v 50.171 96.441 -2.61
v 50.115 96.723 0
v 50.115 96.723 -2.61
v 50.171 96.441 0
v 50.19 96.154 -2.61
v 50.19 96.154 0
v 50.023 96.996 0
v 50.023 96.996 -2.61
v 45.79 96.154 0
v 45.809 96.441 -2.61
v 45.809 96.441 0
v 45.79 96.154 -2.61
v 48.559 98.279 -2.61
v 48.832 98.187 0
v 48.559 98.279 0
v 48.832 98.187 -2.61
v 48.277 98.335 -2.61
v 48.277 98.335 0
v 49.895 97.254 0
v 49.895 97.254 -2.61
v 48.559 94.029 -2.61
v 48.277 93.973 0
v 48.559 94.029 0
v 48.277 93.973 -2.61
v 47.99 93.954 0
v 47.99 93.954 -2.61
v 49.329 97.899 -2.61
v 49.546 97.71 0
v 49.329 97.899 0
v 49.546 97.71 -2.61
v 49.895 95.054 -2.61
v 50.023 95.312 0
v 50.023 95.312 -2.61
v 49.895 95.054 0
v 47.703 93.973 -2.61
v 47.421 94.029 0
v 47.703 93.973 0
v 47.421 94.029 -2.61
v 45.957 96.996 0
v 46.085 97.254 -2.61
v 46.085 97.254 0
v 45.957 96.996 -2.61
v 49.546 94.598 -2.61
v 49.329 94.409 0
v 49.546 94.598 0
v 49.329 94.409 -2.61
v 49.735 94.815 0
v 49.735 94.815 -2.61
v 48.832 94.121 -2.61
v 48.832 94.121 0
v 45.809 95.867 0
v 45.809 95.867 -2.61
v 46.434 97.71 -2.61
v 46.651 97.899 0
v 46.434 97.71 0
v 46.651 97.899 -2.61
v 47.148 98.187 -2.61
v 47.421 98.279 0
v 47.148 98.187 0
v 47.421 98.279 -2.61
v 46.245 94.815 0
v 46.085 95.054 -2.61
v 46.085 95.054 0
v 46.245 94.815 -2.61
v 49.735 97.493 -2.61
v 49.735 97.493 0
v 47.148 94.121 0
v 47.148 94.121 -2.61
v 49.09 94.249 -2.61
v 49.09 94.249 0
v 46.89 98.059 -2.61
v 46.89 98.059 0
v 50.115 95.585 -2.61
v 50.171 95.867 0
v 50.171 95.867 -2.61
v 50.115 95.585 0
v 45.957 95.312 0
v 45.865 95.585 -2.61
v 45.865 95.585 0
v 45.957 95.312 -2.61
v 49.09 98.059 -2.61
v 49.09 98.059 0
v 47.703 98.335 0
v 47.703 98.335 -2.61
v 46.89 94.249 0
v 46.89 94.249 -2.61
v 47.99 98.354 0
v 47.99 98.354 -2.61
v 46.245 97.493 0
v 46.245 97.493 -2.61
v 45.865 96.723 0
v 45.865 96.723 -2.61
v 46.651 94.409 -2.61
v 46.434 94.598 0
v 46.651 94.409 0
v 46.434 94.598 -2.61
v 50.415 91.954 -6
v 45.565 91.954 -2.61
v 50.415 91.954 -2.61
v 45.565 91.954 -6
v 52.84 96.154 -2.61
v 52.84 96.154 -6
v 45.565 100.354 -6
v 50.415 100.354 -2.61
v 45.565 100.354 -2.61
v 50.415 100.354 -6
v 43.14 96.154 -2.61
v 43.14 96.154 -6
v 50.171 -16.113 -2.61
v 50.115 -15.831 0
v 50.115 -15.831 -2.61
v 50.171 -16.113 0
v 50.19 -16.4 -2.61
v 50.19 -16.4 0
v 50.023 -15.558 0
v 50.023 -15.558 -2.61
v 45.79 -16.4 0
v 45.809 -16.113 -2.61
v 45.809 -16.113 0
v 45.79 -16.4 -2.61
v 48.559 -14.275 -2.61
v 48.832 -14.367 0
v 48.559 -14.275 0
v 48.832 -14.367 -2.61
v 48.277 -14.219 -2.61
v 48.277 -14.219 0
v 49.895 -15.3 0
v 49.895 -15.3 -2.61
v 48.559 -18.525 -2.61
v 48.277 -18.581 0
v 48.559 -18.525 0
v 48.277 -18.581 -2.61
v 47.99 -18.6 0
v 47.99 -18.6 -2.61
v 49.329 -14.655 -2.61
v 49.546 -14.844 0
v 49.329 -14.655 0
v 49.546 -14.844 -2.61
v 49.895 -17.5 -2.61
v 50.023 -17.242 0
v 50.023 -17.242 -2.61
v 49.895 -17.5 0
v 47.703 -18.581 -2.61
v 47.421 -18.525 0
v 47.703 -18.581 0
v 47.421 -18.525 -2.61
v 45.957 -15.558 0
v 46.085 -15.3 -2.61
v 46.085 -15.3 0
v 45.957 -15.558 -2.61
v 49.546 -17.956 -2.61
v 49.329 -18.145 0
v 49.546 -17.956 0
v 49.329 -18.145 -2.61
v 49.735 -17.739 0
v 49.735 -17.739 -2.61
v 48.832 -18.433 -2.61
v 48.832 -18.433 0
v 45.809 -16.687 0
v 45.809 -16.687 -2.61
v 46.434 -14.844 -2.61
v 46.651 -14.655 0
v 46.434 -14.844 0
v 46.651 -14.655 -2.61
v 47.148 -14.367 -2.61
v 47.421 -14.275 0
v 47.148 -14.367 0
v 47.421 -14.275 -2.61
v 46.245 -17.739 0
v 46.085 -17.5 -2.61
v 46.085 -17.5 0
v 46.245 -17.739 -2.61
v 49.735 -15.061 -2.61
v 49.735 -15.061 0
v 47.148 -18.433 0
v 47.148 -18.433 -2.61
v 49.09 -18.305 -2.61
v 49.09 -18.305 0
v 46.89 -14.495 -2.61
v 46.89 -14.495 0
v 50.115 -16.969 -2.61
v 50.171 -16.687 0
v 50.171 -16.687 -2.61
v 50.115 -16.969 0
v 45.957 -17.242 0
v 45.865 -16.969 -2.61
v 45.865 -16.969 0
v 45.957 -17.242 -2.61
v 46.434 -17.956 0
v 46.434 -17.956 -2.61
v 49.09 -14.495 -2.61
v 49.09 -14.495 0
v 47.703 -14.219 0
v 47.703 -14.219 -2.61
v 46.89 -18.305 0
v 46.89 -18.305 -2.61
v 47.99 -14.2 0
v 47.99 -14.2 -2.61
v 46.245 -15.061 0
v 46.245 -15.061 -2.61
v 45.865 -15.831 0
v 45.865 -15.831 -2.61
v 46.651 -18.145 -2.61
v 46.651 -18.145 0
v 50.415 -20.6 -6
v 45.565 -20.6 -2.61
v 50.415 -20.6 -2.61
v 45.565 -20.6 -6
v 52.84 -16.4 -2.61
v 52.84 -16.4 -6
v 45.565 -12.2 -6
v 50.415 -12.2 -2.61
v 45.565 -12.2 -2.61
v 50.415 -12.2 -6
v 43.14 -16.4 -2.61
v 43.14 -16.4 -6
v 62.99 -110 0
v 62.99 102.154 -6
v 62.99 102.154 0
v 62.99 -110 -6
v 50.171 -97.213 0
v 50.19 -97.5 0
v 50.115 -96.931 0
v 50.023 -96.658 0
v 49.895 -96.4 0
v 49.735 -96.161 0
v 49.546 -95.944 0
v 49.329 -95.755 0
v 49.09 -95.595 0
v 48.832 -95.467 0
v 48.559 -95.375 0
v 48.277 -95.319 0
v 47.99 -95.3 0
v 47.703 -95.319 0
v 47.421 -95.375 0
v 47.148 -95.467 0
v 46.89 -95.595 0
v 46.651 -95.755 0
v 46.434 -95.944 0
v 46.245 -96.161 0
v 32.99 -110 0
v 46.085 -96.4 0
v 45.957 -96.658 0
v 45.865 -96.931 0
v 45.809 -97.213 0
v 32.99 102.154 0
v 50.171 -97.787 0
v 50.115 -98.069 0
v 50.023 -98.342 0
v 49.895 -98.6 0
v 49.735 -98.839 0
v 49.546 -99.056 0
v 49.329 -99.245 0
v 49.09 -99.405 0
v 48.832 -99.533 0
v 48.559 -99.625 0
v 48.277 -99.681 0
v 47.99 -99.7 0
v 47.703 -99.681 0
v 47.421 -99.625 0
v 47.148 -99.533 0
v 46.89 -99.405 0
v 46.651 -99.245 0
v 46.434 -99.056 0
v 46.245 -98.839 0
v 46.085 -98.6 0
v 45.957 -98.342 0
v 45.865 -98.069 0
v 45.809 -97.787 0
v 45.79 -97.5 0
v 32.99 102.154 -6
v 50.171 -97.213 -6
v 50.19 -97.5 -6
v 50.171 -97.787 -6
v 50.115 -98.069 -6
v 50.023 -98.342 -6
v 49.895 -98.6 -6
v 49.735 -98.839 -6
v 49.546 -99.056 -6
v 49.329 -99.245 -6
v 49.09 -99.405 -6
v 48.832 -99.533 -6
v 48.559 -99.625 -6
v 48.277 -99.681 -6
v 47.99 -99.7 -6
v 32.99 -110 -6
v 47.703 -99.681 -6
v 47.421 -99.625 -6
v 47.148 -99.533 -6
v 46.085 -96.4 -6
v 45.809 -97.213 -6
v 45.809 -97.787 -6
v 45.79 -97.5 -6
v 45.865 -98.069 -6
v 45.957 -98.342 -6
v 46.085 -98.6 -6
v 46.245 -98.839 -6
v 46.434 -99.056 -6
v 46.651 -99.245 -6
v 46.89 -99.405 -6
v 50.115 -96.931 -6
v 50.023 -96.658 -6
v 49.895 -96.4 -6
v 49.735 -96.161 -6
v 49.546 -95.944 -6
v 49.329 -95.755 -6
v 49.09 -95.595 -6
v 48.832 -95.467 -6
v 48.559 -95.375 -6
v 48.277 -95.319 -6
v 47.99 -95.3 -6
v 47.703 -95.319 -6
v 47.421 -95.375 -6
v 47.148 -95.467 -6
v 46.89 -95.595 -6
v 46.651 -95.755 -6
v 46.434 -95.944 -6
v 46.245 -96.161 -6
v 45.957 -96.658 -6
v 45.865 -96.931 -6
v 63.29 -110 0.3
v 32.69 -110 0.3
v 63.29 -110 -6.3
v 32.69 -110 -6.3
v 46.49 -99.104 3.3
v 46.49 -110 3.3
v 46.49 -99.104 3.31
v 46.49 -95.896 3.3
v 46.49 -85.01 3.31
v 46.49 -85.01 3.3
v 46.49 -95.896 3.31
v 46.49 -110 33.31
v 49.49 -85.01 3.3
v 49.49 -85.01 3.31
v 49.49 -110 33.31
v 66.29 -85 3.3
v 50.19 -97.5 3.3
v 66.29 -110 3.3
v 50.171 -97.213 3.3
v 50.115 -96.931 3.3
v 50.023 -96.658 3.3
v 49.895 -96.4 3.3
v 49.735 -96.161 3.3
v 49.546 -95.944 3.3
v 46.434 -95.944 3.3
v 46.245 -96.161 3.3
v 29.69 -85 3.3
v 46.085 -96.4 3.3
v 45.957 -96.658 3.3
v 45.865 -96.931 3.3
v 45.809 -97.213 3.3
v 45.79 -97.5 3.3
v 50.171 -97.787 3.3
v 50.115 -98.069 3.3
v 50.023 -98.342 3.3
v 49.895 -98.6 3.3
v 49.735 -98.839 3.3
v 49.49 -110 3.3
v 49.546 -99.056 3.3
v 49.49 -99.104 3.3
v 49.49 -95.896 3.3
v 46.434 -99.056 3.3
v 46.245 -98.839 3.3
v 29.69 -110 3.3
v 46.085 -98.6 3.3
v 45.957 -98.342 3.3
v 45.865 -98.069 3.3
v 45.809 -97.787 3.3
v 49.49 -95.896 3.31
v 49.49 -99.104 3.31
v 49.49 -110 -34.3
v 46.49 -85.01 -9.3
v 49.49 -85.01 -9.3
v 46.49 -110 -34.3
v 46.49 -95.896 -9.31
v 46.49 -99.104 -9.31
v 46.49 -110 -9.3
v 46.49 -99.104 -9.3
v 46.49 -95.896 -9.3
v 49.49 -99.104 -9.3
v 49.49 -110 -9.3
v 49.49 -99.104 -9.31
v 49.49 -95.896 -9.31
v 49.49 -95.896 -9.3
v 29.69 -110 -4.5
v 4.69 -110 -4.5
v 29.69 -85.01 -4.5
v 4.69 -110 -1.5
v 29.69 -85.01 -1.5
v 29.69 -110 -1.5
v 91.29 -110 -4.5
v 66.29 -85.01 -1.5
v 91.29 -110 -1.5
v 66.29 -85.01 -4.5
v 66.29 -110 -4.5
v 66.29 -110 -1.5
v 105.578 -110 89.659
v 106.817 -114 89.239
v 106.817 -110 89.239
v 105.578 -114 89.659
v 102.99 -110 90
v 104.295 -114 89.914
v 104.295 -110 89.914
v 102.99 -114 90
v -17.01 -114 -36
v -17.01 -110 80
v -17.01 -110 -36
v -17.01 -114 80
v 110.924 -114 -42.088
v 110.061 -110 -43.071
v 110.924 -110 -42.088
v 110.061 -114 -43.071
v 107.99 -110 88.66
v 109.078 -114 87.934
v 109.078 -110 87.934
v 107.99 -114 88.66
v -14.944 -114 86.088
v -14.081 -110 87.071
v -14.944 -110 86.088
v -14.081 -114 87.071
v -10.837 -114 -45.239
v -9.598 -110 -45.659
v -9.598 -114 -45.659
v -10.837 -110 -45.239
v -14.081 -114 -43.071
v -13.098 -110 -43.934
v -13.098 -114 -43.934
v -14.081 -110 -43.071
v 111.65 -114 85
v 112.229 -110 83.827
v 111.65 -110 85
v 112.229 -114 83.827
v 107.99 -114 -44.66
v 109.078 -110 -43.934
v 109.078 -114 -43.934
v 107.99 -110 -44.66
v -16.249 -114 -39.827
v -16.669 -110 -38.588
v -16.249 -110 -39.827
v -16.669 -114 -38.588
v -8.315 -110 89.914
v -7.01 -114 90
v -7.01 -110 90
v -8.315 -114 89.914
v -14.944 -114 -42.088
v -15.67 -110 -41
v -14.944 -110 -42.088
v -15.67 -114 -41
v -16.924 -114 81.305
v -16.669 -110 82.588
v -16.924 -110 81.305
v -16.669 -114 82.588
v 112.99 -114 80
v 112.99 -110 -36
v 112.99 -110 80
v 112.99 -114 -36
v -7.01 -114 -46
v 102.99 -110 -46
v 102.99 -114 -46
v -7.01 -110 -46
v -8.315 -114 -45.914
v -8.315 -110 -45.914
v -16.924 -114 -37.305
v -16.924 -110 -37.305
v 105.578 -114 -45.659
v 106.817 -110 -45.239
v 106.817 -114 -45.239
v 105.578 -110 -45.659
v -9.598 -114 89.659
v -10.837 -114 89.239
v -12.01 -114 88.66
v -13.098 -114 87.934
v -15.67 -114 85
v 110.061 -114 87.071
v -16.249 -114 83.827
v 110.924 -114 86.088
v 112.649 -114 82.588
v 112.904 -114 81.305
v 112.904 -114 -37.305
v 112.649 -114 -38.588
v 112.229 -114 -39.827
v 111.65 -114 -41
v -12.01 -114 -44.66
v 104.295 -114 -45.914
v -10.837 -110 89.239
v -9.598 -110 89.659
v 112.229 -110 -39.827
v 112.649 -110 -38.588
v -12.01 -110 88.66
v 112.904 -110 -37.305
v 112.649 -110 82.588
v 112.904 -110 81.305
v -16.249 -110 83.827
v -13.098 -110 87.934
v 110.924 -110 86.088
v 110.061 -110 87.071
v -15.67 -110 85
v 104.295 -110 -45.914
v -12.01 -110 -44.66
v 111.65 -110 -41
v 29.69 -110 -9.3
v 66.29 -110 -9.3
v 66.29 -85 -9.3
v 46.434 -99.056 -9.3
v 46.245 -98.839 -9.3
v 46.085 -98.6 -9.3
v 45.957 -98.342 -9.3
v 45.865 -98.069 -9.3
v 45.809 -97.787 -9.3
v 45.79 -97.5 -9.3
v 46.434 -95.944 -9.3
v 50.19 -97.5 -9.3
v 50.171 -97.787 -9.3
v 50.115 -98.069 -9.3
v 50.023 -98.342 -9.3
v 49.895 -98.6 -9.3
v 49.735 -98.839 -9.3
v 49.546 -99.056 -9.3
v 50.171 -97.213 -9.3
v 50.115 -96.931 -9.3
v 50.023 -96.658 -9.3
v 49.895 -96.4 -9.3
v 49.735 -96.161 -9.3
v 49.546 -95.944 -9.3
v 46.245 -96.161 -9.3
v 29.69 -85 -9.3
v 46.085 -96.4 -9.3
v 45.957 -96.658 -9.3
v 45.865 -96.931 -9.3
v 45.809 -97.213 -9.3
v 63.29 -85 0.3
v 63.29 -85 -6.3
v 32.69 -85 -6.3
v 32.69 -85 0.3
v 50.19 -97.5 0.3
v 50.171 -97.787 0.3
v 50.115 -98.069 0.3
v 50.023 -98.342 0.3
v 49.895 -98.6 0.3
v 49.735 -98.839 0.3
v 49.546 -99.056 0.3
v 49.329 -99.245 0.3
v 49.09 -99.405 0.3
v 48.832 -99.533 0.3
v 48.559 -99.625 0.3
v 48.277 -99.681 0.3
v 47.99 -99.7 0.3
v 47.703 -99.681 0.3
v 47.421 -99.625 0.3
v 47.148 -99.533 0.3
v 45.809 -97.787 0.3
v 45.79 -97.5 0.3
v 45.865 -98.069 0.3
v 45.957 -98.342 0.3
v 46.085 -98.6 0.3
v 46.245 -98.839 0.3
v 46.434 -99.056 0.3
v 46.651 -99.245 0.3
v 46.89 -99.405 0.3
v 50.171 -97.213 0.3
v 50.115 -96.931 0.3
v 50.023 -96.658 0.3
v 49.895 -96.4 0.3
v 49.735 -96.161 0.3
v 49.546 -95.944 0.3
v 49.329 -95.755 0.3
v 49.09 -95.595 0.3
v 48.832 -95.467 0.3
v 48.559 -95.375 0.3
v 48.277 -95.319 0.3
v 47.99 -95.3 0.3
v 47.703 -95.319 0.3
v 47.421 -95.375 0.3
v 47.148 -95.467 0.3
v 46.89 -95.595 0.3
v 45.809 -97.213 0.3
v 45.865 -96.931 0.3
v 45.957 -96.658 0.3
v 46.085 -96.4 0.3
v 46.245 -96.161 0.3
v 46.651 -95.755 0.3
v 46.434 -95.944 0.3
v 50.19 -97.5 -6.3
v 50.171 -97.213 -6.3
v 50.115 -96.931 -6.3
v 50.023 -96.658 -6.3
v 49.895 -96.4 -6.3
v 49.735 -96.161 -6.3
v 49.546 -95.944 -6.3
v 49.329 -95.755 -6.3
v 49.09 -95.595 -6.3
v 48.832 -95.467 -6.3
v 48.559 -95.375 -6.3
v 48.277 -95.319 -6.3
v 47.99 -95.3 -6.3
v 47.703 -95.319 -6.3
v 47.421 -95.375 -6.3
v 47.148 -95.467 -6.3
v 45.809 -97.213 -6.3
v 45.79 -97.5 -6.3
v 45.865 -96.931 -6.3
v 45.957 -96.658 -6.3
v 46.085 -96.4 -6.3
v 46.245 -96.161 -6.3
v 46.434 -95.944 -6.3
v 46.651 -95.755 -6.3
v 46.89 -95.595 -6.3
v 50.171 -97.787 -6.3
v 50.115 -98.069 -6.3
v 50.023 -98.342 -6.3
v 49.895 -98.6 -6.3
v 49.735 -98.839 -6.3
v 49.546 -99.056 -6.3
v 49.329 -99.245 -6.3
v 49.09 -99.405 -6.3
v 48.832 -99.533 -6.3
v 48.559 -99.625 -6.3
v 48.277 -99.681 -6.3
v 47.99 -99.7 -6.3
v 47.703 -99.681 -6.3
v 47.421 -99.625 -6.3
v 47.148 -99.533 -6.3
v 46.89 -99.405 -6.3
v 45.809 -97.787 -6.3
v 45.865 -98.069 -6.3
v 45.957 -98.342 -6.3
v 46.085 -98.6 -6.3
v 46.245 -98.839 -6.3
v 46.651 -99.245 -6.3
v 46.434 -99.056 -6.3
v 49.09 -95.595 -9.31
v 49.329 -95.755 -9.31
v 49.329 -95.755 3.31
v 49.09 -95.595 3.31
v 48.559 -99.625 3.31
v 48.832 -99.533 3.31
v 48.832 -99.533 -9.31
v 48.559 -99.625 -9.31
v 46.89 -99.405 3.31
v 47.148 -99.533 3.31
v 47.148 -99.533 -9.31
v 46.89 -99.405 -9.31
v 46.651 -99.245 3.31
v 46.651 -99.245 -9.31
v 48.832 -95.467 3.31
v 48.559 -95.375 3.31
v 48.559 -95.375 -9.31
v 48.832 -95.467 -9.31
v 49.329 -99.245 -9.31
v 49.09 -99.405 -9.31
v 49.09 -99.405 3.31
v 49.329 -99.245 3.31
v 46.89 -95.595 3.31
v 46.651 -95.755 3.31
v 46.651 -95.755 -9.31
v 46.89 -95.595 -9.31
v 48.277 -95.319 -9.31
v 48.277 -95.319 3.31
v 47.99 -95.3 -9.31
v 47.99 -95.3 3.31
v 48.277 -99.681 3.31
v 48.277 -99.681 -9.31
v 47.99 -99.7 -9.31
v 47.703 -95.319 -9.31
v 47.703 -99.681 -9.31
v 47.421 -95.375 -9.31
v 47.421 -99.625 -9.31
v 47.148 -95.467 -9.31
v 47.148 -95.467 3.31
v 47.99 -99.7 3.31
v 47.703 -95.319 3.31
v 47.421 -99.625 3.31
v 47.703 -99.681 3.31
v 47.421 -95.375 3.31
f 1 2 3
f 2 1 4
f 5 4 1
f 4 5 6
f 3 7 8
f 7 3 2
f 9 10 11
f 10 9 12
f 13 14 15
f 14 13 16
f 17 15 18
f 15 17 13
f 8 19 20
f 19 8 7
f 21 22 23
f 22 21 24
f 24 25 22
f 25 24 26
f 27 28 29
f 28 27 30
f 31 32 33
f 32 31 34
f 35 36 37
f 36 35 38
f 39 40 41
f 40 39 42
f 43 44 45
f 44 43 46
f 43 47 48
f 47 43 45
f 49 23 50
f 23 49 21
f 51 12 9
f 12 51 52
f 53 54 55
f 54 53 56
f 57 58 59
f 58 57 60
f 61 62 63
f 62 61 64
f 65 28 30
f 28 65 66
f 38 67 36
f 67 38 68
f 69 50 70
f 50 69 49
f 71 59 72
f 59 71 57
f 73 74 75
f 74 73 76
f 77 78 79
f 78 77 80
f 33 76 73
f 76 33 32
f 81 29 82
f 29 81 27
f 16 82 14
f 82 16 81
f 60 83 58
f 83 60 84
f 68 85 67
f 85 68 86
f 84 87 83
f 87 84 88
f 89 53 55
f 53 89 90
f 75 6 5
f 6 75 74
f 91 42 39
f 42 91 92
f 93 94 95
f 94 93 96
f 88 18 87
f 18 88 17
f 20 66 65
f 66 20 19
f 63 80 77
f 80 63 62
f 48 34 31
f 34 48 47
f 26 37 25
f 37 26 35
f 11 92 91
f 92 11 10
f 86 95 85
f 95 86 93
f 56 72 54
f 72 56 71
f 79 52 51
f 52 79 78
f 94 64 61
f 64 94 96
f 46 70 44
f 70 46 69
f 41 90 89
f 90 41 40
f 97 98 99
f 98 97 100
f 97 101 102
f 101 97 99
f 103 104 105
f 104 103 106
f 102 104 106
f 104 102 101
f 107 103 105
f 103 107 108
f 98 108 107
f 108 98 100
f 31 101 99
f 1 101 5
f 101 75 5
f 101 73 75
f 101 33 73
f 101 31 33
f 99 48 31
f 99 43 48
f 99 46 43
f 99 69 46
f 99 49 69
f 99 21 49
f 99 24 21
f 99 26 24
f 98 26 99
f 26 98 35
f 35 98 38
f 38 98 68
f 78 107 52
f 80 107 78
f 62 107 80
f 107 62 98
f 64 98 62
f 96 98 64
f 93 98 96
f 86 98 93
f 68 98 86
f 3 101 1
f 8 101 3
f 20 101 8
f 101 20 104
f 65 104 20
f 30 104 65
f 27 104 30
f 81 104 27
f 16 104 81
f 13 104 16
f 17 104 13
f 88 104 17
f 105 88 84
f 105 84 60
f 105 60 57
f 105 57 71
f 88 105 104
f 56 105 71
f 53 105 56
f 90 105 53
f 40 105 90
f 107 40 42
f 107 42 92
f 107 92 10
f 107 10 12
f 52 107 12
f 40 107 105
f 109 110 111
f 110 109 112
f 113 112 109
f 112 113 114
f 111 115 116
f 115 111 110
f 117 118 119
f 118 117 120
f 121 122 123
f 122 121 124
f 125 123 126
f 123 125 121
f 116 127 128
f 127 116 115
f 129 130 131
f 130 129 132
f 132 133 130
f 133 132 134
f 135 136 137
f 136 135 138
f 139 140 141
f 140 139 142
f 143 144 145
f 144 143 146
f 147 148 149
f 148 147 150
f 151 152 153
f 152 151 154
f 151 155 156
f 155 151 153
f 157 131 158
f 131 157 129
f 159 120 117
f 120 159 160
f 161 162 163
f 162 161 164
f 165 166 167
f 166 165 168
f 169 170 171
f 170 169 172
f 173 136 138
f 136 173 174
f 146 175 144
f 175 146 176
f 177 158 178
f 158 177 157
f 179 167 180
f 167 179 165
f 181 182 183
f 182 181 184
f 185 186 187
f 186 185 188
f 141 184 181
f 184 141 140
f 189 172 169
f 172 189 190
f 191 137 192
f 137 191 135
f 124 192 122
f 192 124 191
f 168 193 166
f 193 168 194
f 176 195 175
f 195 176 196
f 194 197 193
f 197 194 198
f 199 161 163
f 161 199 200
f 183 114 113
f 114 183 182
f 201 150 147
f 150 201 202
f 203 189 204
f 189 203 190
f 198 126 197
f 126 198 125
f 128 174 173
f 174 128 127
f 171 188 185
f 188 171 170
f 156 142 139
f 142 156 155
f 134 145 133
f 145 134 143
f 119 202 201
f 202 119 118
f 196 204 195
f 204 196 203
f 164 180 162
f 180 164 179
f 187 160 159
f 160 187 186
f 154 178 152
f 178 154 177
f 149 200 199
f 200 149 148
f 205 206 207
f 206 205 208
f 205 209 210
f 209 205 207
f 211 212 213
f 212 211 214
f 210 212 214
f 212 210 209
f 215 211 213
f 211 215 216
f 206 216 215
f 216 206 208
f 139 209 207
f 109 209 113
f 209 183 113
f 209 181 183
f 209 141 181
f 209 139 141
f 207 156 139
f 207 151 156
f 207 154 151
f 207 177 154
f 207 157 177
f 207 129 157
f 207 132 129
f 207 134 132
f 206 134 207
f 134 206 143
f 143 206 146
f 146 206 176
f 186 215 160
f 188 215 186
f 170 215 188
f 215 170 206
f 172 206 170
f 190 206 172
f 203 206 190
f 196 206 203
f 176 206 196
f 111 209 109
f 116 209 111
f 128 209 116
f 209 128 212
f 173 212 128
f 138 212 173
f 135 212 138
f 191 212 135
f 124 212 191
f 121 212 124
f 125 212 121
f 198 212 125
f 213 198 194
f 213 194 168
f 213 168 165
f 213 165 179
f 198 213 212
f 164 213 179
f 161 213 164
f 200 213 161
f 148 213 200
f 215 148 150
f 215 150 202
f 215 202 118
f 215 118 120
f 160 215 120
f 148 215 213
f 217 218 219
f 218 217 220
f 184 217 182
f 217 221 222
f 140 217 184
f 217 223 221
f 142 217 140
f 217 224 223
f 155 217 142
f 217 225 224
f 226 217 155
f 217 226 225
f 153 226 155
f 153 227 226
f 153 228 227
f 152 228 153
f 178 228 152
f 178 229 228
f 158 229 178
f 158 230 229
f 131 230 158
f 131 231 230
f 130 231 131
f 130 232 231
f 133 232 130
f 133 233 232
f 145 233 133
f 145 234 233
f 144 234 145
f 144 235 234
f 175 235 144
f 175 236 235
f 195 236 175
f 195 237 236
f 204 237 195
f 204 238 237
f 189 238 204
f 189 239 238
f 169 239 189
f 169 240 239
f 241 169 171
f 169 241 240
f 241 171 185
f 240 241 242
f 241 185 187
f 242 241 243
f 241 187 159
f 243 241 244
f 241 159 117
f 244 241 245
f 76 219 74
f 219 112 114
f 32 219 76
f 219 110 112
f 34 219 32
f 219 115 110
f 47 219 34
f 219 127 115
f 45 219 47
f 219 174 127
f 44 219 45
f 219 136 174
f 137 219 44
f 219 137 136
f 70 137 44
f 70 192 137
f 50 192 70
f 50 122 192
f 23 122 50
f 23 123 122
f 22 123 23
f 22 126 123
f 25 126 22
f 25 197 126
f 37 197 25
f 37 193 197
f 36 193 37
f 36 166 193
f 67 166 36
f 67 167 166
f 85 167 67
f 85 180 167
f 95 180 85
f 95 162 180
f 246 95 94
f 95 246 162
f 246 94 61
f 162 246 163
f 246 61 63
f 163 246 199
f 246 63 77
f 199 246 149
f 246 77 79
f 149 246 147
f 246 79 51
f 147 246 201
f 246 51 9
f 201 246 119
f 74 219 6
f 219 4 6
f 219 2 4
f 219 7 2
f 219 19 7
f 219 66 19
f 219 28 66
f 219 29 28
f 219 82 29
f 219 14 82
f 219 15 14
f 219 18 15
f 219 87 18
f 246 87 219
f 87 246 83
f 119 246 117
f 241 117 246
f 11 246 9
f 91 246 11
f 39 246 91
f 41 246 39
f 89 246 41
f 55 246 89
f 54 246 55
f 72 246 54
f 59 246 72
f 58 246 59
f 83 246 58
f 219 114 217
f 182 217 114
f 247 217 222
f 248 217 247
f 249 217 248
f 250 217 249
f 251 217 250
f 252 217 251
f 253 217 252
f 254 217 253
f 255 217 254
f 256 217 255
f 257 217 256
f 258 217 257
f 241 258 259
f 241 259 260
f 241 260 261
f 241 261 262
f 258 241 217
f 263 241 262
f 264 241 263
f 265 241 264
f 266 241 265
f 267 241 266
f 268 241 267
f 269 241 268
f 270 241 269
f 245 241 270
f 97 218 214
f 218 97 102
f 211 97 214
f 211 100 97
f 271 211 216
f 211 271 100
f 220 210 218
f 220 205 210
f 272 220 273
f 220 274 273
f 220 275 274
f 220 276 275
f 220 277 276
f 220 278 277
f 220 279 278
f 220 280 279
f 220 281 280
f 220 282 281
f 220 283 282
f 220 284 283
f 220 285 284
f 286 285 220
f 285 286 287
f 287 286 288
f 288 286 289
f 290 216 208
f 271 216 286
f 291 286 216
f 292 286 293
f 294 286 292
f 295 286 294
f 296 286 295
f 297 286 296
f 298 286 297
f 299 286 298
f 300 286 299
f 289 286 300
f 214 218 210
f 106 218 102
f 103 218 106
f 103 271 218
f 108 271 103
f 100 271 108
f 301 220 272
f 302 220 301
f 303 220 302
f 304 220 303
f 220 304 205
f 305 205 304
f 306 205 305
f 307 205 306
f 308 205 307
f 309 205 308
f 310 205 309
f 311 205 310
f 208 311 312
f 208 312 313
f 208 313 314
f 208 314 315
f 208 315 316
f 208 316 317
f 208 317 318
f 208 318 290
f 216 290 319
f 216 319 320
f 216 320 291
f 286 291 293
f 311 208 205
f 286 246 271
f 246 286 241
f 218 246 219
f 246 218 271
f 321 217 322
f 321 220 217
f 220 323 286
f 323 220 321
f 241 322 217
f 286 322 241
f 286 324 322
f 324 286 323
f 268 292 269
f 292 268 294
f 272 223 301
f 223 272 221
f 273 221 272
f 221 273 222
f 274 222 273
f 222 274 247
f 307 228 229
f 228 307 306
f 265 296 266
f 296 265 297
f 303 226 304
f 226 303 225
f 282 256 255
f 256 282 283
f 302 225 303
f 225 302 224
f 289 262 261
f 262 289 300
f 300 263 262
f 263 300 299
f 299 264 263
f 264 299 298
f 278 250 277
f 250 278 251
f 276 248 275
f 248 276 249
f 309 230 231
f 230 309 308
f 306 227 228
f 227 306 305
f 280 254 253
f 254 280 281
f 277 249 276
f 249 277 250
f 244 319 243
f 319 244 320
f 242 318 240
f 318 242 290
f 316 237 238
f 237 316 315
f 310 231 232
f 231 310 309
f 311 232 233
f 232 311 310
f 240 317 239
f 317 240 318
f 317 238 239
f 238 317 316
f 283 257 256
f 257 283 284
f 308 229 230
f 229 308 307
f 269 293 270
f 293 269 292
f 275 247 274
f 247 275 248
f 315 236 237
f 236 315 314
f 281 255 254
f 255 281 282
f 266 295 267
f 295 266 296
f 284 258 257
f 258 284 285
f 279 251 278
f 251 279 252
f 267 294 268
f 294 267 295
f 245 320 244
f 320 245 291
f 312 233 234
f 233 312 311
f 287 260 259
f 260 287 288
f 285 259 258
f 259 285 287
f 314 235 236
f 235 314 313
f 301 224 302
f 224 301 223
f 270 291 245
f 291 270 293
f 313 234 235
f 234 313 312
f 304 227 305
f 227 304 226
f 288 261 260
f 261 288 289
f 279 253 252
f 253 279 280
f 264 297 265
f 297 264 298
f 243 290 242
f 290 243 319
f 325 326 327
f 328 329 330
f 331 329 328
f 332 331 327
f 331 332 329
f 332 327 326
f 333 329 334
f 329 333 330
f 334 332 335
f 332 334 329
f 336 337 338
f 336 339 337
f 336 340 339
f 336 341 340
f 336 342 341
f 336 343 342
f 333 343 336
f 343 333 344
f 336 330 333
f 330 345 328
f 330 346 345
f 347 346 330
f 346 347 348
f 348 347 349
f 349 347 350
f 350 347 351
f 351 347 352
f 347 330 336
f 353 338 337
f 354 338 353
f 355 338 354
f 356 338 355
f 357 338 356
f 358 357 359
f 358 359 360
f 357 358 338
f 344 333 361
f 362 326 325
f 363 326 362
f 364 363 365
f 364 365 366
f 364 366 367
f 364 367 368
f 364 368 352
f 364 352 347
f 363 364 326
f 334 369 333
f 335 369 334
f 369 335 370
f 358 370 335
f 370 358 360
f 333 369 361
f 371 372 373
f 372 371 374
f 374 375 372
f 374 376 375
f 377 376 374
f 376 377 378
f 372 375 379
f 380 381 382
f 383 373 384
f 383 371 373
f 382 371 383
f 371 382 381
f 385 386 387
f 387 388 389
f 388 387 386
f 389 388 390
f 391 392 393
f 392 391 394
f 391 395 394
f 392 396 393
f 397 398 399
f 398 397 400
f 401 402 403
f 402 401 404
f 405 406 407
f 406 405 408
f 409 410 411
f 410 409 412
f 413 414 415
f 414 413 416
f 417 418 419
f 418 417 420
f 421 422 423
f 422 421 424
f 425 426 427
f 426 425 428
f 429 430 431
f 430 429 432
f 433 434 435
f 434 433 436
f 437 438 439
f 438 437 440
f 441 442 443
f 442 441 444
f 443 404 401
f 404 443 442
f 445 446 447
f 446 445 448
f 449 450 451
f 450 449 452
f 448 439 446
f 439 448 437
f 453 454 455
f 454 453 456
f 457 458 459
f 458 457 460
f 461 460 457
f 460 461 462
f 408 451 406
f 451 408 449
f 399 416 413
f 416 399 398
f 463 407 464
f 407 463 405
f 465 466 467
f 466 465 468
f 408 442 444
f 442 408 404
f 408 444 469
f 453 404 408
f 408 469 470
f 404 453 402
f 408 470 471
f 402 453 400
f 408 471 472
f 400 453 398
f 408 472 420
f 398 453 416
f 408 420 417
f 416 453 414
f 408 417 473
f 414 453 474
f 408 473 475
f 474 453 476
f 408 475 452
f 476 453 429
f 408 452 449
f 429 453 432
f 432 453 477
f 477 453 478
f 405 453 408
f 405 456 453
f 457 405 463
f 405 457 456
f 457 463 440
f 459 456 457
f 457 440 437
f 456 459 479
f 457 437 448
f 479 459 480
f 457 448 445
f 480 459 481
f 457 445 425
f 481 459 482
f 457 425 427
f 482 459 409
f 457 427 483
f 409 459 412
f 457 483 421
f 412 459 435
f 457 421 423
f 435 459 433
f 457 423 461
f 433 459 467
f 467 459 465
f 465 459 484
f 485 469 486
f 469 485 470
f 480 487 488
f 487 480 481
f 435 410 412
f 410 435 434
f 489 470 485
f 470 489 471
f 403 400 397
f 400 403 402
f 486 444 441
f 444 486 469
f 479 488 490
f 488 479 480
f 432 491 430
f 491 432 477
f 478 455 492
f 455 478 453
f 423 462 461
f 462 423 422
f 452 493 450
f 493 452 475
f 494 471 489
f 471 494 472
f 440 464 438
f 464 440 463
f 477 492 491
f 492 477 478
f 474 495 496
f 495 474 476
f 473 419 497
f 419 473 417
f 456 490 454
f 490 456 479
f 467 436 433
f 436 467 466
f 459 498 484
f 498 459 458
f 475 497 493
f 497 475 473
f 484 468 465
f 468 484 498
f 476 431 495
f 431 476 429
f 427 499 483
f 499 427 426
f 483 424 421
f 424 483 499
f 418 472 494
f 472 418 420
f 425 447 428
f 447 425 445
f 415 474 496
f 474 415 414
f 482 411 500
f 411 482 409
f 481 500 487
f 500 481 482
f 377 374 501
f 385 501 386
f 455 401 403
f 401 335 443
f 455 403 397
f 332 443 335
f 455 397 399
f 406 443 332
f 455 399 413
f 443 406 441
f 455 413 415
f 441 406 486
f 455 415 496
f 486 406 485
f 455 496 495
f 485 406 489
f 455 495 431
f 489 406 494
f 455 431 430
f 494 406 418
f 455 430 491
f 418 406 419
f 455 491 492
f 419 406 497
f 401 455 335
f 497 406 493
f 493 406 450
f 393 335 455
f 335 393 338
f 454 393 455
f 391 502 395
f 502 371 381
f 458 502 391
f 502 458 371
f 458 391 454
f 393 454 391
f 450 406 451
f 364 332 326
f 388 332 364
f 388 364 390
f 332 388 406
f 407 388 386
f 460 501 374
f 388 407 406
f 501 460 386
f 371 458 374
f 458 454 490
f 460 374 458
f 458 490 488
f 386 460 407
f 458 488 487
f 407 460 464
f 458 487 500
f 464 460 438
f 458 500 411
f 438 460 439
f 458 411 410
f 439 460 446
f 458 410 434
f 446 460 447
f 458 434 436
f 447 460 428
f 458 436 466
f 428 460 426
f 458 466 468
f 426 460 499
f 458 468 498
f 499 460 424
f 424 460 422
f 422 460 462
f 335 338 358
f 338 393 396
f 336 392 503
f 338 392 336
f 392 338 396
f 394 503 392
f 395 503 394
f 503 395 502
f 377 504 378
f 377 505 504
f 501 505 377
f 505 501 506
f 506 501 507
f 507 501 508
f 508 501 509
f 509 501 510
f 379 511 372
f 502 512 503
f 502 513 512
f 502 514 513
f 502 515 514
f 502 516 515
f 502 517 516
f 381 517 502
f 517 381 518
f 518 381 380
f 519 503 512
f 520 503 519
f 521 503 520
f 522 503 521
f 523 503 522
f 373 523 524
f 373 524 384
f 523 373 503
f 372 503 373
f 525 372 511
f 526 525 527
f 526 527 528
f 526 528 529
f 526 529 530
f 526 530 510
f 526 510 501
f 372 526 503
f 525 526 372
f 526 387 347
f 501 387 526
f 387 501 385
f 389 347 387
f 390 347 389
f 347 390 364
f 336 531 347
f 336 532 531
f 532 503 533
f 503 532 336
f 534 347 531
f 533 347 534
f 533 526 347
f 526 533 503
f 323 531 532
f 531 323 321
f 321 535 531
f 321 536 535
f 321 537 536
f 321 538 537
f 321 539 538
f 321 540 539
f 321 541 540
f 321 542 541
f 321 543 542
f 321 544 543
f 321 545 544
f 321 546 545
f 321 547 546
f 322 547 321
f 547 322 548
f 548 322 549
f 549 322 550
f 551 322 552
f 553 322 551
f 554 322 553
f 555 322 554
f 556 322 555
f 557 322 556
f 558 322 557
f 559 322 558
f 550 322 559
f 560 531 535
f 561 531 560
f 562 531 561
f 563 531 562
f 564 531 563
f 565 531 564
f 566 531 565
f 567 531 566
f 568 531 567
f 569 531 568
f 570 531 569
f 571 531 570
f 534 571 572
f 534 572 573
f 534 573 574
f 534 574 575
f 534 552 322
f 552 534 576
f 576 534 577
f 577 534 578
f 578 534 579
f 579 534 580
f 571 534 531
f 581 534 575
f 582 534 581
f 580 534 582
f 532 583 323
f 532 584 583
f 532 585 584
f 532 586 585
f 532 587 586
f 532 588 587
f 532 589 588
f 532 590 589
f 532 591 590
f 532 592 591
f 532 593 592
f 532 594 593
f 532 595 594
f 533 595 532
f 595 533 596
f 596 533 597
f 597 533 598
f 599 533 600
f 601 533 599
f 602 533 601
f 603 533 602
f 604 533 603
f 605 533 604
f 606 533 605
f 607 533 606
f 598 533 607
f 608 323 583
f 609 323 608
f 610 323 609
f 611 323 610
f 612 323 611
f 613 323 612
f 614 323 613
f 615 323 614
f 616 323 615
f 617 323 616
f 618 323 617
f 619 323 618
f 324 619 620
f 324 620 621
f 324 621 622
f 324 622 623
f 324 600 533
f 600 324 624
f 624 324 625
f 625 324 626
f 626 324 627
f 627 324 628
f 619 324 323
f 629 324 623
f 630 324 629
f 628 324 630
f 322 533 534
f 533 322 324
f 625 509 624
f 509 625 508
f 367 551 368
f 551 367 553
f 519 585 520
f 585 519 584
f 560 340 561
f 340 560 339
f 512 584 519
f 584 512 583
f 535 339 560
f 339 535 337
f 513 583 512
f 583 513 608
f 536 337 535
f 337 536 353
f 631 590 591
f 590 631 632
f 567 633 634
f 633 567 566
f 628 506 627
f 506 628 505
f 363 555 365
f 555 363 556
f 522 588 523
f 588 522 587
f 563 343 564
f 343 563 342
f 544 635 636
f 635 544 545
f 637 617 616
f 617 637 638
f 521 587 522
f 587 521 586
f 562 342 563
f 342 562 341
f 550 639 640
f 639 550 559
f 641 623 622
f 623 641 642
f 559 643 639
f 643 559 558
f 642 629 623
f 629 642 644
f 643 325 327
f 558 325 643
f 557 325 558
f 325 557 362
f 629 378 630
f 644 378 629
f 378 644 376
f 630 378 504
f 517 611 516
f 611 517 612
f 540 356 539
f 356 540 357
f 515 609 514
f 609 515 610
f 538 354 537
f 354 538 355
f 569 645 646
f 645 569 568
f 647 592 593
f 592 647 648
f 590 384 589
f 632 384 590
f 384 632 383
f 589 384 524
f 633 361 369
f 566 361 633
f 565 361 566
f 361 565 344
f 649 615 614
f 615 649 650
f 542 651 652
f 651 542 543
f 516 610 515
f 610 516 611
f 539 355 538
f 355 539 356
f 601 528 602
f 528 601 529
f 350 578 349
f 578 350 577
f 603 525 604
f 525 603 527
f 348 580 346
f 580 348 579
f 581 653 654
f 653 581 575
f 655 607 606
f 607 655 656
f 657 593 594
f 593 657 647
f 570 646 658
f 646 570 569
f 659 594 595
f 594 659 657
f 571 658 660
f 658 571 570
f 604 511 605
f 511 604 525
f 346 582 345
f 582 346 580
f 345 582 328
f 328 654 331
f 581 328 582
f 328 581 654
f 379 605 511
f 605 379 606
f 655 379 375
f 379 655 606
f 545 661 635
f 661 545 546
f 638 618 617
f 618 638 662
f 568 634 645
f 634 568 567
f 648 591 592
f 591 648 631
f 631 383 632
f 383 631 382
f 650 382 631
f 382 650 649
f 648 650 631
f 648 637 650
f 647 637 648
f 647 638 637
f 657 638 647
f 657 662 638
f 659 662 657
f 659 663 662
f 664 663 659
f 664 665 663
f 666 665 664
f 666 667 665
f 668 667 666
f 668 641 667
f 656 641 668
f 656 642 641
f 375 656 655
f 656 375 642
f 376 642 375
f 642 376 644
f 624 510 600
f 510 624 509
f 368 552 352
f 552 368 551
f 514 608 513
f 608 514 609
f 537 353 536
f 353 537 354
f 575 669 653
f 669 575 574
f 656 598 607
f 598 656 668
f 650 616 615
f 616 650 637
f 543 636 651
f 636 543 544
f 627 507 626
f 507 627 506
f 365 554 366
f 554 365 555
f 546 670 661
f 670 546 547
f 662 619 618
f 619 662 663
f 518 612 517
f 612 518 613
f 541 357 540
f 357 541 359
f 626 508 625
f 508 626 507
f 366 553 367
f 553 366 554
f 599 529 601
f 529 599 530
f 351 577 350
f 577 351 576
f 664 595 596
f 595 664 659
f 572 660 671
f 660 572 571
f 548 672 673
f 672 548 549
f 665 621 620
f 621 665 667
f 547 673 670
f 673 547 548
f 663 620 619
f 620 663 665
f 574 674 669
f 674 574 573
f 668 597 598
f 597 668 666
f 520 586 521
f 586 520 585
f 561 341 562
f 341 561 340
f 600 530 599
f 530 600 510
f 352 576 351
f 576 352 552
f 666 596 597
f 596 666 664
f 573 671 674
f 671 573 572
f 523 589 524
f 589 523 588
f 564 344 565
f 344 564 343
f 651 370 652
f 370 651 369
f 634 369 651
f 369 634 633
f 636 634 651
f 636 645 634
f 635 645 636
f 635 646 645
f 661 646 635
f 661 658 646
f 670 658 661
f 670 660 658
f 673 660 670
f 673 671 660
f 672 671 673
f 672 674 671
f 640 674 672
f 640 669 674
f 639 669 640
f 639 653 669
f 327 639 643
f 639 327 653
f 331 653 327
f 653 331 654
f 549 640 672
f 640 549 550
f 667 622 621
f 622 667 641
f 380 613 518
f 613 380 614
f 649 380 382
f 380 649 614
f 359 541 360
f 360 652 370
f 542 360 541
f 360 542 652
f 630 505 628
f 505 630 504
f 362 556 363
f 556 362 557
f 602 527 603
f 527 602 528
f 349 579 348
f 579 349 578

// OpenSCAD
// Pied de table : boîtier + abri de sonde clipsé, debout sur une table.
// Unités : mm. Matière : PETG.
//
// Le mât tient lieu de mur : le boîtier s'y visse par ses deux pattes murales
// (M4 tête fraisée + écrous noyés dans le dos du mât), l'abri reste clipsé sous
// la patte basse comme au mur. Le mât s'emboîte dans la semelle (1 vis M4).
//
// Pièces (imprimables sans support) :
//   mast : mât, à plat, dos sur le plateau                 x1
//   foot : semelle avec douille, dessous sur le plateau     x1
// Export :
//   openscad -D 'part="mast"' -o stand_mast.3mf stand.scad
//   openscad -D 'part="foot"' -o stand_foot.3mf stand.scad
//
// Repère = celui de tinysensor_box.scad (X droite, Y haut, Z sortant du mur, mur en Z = 0).

/* [Rendu] */
part = "assembly"; // [mast, foot, assembly]

/* [Repris de tinysensor_box.scad / sensor_shield.scad — à garder alignés] */
cav_w = 95.98;
ear_top = 102.154;              // bout de la patte haute (cav_h + wall + flange + ear_l)
ear_holes_y = [96.154, -16.4];  // axes des trous de vis murales des pattes
shield_bottom = -80;            // dessous de l'abri clipsé (oy de assembly.scad)
shield_front = 72;              // avant de l'abri (wall_y + clip_t + plate_d / 2)

/* [Mât] */
mast_w = 30;
mast_t = 6;
under_clr = 30;    // dégagement sous l'abri : boucle du câble qui remonte par le fond

/* [Semelle] */
foot_w = 130;      // largeur (X)
foot_back = 40;    // débord derrière le mât
foot_front = 90;   // débord devant le mur (l'abri avance jusqu'à shield_front)
foot_t = 4;
foot_r = 10;
socket_h = 25;     // profondeur d'emboîtement du mât
socket_wall = 3;
fit = 0.3;         // jeu mât / douille
gusset_t = 3;

/* [Visserie] */
screw_d = 4.4;     // M4
nut_af = 8.4;      // écrou M4 (7.9 sur plats + jeu)
nut_h = 3.4;

$fn = 48;
eps = 0.01;

cx = cav_w / 2;
y_bot = shield_bottom - under_clr;   // pied du mât = dessus de la semelle
y_floor = y_bot - foot_t;             // table
mast_l = ear_top - y_bot;
socket_screw_y = y_bot + socket_h / 2;

module mast_use() {
  difference() {
    translate([cx - mast_w / 2, y_bot, -mast_t]) cube([mast_w, mast_l, mast_t]);
    // vis des pattes du boîtier, écrous noyés dans le dos
    for (y = ear_holes_y) translate([cx, y, -mast_t - eps]) {
      cylinder(d = screw_d, h = mast_t + 2 * eps);
      cylinder(d = nut_af / cos(30), h = nut_h, $fn = 6);
    }
    // vis de la douille
    translate([cx, socket_screw_y, -mast_t - eps]) cylinder(d = screw_d, h = mast_t + 2 * eps);
  }
}

module foot_use() {
  sx = mast_w / 2 + fit + socket_wall;   // demi-largeur extérieure de la douille
  z0 = -mast_t - fit - socket_wall;      // dos de la douille
  z1 = fit + socket_wall;                // face avant de la douille
  difference() {
    union() {
      // semelle
      translate([0, y_floor, 0]) rotate([-90, 0, 0]) linear_extrude(foot_t)
        translate([cx - foot_w / 2, -foot_front]) offset(r = foot_r) offset(delta = -foot_r)
          square([foot_w, foot_front + mast_t + foot_back]);
      // douille
      translate([cx - sx, y_bot - eps, z0]) cube([2 * sx, socket_h + eps, z1 - z0]);
      // goussets avant / arrière (plan YZ) et latéraux (plan XY)
      for (g = [[z1, z1 + 30], [z0, z0 - 25]])
        hull() {
          translate([cx - gusset_t / 2, y_bot - eps, g[0]]) cube([gusset_t, socket_h, eps]);
          translate([cx - gusset_t / 2, y_bot - eps, g[1]]) cube([gusset_t, eps, eps]);
        }
      for (s = [-1, 1])
        hull() {
          translate([cx + s * sx - (s > 0 ? eps : 0), y_bot - eps, -mast_t / 2 - gusset_t / 2]) cube([eps, socket_h, gusset_t]);
          translate([cx + s * (sx + 25) - (s > 0 ? eps : 0), y_bot - eps, -mast_t / 2 - gusset_t / 2]) cube([eps, eps, gusset_t]);
        }
    }
    // logement du mât
    translate([cx - mast_w / 2 - fit, y_bot, -mast_t - fit]) cube([mast_w + 2 * fit, socket_h + eps, mast_t + 2 * fit]);
    // vis traversante M4 x 20 + écrou
    translate([cx, socket_screw_y, z0 - eps]) cylinder(d = screw_d, h = z1 - z0 + 2 * eps);
  }
}

if (part == "mast") translate([0, 0, mast_t]) mast_use();          // dos sur le plateau
else if (part == "foot") translate([0, 0, -y_floor]) rotate([90, 0, 0]) foot_use(); // Y d'usage -> Z
else {
  color("Peru") mast_use();
  color("Sienna") foot_use();
}
